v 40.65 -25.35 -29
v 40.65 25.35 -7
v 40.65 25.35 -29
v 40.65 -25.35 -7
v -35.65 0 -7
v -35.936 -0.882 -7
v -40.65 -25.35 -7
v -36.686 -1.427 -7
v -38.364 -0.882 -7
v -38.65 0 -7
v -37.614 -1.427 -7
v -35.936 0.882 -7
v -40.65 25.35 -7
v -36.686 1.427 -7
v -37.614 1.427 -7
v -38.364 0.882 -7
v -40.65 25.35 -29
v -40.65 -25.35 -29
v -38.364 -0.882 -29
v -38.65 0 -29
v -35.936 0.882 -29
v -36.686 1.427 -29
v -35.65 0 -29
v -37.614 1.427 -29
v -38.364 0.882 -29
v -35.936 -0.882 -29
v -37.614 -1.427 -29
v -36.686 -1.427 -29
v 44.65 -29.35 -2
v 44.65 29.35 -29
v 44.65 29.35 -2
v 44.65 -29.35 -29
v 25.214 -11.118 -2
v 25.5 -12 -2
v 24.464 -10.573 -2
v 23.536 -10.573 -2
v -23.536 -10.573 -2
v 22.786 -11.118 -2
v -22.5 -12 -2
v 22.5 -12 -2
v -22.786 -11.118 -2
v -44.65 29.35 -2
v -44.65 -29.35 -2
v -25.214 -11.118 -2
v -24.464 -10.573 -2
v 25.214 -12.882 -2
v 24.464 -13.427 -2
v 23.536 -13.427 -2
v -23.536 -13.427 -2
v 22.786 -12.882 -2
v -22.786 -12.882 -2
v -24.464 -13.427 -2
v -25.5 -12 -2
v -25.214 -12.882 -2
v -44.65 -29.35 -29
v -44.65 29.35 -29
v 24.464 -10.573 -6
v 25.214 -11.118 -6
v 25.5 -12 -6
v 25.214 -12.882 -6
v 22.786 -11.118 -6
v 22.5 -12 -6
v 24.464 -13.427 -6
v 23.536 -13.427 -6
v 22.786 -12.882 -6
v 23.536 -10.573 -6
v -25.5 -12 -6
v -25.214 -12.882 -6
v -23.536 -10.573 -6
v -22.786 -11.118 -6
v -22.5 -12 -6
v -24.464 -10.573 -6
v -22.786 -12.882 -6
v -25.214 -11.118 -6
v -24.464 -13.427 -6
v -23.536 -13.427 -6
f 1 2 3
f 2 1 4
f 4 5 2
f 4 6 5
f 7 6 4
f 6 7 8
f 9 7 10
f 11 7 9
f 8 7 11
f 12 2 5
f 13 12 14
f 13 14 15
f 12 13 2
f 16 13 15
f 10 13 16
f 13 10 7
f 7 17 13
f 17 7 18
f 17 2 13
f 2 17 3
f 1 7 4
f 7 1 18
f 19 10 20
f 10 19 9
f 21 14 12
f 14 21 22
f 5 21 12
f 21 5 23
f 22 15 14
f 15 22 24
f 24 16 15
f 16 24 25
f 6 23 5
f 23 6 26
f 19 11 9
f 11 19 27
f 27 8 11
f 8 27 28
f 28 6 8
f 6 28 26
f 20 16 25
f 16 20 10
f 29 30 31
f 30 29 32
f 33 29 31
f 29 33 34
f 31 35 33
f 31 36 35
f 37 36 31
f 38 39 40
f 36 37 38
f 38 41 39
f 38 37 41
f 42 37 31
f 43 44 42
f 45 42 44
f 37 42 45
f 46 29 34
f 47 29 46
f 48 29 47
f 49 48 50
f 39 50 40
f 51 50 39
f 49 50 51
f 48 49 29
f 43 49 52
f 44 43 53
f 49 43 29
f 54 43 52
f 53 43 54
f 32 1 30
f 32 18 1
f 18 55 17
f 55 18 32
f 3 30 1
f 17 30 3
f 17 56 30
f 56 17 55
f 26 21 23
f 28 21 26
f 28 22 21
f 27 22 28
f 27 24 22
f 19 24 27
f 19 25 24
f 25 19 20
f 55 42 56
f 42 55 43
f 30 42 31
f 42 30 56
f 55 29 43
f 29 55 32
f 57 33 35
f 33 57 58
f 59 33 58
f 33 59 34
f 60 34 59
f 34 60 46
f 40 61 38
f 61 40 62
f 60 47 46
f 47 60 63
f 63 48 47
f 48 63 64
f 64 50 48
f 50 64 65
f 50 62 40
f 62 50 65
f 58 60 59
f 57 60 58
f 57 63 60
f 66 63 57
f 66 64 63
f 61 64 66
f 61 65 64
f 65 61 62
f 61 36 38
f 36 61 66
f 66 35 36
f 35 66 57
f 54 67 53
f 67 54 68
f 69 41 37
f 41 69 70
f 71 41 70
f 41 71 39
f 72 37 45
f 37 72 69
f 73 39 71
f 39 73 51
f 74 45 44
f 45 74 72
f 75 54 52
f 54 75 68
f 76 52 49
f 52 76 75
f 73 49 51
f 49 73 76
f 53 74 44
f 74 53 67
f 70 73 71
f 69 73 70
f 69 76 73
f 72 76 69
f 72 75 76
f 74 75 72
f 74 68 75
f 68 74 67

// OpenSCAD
// file: ../pills/electronics.scad
use <dimensions.scad>

hole_inset = 3.5;
module electronics() {
    translate([0, 0, -electronics_thickness()/2-3])
    difference() {
        cube([electronics_width(), electronics_height(), electronics_thickness()], center=true);
        translate([-electronics_width()/2 + hole_inset, 0, 0])
        cylinder(h=electronics_thickness()*2, r=1.5, center=true);
    }
}

electronics();
// file: ../pills/dimensions.scad
function plate_width() = 193.422;
function plate_height() = 117.392;
function plate_thickness() = 3;
function separation() = 5;
function led_width() = 10;
function led_height() = 2.5;
function hole_radius() = 1.5;
function hole_offset() = 3.5 + hole_radius();
function separator_thickness() = (led_width()-plate_thickness())/2;

function electronics_width() = 81.3;
function electronics_height() = 50.7;
function electronics_thickness() = 23;
// main file
use <../pills/dimensions.scad>
use <../pills/electronics.scad>

$fs=1;
$fa=0.1;
thickness=4;
module electronics_holder() {
    difference() {
        translate([0, 0, -electronics_thickness()/2 - thickness])
        cube([electronics_width() + thickness*2, electronics_height() + thickness*2, electronics_thickness()+thickness], center=true);
        translate([0, 0, -thickness])
        electronics();
        translate([(64-16)/2, -12, 0])
        cylinder(h=thickness*3, r=1.5, center=true);
        translate([-(64-16)/2, -12, 0])
        cylinder(h=thickness*3, r=1.5, center=true);
    }
}

electronics_holder();
